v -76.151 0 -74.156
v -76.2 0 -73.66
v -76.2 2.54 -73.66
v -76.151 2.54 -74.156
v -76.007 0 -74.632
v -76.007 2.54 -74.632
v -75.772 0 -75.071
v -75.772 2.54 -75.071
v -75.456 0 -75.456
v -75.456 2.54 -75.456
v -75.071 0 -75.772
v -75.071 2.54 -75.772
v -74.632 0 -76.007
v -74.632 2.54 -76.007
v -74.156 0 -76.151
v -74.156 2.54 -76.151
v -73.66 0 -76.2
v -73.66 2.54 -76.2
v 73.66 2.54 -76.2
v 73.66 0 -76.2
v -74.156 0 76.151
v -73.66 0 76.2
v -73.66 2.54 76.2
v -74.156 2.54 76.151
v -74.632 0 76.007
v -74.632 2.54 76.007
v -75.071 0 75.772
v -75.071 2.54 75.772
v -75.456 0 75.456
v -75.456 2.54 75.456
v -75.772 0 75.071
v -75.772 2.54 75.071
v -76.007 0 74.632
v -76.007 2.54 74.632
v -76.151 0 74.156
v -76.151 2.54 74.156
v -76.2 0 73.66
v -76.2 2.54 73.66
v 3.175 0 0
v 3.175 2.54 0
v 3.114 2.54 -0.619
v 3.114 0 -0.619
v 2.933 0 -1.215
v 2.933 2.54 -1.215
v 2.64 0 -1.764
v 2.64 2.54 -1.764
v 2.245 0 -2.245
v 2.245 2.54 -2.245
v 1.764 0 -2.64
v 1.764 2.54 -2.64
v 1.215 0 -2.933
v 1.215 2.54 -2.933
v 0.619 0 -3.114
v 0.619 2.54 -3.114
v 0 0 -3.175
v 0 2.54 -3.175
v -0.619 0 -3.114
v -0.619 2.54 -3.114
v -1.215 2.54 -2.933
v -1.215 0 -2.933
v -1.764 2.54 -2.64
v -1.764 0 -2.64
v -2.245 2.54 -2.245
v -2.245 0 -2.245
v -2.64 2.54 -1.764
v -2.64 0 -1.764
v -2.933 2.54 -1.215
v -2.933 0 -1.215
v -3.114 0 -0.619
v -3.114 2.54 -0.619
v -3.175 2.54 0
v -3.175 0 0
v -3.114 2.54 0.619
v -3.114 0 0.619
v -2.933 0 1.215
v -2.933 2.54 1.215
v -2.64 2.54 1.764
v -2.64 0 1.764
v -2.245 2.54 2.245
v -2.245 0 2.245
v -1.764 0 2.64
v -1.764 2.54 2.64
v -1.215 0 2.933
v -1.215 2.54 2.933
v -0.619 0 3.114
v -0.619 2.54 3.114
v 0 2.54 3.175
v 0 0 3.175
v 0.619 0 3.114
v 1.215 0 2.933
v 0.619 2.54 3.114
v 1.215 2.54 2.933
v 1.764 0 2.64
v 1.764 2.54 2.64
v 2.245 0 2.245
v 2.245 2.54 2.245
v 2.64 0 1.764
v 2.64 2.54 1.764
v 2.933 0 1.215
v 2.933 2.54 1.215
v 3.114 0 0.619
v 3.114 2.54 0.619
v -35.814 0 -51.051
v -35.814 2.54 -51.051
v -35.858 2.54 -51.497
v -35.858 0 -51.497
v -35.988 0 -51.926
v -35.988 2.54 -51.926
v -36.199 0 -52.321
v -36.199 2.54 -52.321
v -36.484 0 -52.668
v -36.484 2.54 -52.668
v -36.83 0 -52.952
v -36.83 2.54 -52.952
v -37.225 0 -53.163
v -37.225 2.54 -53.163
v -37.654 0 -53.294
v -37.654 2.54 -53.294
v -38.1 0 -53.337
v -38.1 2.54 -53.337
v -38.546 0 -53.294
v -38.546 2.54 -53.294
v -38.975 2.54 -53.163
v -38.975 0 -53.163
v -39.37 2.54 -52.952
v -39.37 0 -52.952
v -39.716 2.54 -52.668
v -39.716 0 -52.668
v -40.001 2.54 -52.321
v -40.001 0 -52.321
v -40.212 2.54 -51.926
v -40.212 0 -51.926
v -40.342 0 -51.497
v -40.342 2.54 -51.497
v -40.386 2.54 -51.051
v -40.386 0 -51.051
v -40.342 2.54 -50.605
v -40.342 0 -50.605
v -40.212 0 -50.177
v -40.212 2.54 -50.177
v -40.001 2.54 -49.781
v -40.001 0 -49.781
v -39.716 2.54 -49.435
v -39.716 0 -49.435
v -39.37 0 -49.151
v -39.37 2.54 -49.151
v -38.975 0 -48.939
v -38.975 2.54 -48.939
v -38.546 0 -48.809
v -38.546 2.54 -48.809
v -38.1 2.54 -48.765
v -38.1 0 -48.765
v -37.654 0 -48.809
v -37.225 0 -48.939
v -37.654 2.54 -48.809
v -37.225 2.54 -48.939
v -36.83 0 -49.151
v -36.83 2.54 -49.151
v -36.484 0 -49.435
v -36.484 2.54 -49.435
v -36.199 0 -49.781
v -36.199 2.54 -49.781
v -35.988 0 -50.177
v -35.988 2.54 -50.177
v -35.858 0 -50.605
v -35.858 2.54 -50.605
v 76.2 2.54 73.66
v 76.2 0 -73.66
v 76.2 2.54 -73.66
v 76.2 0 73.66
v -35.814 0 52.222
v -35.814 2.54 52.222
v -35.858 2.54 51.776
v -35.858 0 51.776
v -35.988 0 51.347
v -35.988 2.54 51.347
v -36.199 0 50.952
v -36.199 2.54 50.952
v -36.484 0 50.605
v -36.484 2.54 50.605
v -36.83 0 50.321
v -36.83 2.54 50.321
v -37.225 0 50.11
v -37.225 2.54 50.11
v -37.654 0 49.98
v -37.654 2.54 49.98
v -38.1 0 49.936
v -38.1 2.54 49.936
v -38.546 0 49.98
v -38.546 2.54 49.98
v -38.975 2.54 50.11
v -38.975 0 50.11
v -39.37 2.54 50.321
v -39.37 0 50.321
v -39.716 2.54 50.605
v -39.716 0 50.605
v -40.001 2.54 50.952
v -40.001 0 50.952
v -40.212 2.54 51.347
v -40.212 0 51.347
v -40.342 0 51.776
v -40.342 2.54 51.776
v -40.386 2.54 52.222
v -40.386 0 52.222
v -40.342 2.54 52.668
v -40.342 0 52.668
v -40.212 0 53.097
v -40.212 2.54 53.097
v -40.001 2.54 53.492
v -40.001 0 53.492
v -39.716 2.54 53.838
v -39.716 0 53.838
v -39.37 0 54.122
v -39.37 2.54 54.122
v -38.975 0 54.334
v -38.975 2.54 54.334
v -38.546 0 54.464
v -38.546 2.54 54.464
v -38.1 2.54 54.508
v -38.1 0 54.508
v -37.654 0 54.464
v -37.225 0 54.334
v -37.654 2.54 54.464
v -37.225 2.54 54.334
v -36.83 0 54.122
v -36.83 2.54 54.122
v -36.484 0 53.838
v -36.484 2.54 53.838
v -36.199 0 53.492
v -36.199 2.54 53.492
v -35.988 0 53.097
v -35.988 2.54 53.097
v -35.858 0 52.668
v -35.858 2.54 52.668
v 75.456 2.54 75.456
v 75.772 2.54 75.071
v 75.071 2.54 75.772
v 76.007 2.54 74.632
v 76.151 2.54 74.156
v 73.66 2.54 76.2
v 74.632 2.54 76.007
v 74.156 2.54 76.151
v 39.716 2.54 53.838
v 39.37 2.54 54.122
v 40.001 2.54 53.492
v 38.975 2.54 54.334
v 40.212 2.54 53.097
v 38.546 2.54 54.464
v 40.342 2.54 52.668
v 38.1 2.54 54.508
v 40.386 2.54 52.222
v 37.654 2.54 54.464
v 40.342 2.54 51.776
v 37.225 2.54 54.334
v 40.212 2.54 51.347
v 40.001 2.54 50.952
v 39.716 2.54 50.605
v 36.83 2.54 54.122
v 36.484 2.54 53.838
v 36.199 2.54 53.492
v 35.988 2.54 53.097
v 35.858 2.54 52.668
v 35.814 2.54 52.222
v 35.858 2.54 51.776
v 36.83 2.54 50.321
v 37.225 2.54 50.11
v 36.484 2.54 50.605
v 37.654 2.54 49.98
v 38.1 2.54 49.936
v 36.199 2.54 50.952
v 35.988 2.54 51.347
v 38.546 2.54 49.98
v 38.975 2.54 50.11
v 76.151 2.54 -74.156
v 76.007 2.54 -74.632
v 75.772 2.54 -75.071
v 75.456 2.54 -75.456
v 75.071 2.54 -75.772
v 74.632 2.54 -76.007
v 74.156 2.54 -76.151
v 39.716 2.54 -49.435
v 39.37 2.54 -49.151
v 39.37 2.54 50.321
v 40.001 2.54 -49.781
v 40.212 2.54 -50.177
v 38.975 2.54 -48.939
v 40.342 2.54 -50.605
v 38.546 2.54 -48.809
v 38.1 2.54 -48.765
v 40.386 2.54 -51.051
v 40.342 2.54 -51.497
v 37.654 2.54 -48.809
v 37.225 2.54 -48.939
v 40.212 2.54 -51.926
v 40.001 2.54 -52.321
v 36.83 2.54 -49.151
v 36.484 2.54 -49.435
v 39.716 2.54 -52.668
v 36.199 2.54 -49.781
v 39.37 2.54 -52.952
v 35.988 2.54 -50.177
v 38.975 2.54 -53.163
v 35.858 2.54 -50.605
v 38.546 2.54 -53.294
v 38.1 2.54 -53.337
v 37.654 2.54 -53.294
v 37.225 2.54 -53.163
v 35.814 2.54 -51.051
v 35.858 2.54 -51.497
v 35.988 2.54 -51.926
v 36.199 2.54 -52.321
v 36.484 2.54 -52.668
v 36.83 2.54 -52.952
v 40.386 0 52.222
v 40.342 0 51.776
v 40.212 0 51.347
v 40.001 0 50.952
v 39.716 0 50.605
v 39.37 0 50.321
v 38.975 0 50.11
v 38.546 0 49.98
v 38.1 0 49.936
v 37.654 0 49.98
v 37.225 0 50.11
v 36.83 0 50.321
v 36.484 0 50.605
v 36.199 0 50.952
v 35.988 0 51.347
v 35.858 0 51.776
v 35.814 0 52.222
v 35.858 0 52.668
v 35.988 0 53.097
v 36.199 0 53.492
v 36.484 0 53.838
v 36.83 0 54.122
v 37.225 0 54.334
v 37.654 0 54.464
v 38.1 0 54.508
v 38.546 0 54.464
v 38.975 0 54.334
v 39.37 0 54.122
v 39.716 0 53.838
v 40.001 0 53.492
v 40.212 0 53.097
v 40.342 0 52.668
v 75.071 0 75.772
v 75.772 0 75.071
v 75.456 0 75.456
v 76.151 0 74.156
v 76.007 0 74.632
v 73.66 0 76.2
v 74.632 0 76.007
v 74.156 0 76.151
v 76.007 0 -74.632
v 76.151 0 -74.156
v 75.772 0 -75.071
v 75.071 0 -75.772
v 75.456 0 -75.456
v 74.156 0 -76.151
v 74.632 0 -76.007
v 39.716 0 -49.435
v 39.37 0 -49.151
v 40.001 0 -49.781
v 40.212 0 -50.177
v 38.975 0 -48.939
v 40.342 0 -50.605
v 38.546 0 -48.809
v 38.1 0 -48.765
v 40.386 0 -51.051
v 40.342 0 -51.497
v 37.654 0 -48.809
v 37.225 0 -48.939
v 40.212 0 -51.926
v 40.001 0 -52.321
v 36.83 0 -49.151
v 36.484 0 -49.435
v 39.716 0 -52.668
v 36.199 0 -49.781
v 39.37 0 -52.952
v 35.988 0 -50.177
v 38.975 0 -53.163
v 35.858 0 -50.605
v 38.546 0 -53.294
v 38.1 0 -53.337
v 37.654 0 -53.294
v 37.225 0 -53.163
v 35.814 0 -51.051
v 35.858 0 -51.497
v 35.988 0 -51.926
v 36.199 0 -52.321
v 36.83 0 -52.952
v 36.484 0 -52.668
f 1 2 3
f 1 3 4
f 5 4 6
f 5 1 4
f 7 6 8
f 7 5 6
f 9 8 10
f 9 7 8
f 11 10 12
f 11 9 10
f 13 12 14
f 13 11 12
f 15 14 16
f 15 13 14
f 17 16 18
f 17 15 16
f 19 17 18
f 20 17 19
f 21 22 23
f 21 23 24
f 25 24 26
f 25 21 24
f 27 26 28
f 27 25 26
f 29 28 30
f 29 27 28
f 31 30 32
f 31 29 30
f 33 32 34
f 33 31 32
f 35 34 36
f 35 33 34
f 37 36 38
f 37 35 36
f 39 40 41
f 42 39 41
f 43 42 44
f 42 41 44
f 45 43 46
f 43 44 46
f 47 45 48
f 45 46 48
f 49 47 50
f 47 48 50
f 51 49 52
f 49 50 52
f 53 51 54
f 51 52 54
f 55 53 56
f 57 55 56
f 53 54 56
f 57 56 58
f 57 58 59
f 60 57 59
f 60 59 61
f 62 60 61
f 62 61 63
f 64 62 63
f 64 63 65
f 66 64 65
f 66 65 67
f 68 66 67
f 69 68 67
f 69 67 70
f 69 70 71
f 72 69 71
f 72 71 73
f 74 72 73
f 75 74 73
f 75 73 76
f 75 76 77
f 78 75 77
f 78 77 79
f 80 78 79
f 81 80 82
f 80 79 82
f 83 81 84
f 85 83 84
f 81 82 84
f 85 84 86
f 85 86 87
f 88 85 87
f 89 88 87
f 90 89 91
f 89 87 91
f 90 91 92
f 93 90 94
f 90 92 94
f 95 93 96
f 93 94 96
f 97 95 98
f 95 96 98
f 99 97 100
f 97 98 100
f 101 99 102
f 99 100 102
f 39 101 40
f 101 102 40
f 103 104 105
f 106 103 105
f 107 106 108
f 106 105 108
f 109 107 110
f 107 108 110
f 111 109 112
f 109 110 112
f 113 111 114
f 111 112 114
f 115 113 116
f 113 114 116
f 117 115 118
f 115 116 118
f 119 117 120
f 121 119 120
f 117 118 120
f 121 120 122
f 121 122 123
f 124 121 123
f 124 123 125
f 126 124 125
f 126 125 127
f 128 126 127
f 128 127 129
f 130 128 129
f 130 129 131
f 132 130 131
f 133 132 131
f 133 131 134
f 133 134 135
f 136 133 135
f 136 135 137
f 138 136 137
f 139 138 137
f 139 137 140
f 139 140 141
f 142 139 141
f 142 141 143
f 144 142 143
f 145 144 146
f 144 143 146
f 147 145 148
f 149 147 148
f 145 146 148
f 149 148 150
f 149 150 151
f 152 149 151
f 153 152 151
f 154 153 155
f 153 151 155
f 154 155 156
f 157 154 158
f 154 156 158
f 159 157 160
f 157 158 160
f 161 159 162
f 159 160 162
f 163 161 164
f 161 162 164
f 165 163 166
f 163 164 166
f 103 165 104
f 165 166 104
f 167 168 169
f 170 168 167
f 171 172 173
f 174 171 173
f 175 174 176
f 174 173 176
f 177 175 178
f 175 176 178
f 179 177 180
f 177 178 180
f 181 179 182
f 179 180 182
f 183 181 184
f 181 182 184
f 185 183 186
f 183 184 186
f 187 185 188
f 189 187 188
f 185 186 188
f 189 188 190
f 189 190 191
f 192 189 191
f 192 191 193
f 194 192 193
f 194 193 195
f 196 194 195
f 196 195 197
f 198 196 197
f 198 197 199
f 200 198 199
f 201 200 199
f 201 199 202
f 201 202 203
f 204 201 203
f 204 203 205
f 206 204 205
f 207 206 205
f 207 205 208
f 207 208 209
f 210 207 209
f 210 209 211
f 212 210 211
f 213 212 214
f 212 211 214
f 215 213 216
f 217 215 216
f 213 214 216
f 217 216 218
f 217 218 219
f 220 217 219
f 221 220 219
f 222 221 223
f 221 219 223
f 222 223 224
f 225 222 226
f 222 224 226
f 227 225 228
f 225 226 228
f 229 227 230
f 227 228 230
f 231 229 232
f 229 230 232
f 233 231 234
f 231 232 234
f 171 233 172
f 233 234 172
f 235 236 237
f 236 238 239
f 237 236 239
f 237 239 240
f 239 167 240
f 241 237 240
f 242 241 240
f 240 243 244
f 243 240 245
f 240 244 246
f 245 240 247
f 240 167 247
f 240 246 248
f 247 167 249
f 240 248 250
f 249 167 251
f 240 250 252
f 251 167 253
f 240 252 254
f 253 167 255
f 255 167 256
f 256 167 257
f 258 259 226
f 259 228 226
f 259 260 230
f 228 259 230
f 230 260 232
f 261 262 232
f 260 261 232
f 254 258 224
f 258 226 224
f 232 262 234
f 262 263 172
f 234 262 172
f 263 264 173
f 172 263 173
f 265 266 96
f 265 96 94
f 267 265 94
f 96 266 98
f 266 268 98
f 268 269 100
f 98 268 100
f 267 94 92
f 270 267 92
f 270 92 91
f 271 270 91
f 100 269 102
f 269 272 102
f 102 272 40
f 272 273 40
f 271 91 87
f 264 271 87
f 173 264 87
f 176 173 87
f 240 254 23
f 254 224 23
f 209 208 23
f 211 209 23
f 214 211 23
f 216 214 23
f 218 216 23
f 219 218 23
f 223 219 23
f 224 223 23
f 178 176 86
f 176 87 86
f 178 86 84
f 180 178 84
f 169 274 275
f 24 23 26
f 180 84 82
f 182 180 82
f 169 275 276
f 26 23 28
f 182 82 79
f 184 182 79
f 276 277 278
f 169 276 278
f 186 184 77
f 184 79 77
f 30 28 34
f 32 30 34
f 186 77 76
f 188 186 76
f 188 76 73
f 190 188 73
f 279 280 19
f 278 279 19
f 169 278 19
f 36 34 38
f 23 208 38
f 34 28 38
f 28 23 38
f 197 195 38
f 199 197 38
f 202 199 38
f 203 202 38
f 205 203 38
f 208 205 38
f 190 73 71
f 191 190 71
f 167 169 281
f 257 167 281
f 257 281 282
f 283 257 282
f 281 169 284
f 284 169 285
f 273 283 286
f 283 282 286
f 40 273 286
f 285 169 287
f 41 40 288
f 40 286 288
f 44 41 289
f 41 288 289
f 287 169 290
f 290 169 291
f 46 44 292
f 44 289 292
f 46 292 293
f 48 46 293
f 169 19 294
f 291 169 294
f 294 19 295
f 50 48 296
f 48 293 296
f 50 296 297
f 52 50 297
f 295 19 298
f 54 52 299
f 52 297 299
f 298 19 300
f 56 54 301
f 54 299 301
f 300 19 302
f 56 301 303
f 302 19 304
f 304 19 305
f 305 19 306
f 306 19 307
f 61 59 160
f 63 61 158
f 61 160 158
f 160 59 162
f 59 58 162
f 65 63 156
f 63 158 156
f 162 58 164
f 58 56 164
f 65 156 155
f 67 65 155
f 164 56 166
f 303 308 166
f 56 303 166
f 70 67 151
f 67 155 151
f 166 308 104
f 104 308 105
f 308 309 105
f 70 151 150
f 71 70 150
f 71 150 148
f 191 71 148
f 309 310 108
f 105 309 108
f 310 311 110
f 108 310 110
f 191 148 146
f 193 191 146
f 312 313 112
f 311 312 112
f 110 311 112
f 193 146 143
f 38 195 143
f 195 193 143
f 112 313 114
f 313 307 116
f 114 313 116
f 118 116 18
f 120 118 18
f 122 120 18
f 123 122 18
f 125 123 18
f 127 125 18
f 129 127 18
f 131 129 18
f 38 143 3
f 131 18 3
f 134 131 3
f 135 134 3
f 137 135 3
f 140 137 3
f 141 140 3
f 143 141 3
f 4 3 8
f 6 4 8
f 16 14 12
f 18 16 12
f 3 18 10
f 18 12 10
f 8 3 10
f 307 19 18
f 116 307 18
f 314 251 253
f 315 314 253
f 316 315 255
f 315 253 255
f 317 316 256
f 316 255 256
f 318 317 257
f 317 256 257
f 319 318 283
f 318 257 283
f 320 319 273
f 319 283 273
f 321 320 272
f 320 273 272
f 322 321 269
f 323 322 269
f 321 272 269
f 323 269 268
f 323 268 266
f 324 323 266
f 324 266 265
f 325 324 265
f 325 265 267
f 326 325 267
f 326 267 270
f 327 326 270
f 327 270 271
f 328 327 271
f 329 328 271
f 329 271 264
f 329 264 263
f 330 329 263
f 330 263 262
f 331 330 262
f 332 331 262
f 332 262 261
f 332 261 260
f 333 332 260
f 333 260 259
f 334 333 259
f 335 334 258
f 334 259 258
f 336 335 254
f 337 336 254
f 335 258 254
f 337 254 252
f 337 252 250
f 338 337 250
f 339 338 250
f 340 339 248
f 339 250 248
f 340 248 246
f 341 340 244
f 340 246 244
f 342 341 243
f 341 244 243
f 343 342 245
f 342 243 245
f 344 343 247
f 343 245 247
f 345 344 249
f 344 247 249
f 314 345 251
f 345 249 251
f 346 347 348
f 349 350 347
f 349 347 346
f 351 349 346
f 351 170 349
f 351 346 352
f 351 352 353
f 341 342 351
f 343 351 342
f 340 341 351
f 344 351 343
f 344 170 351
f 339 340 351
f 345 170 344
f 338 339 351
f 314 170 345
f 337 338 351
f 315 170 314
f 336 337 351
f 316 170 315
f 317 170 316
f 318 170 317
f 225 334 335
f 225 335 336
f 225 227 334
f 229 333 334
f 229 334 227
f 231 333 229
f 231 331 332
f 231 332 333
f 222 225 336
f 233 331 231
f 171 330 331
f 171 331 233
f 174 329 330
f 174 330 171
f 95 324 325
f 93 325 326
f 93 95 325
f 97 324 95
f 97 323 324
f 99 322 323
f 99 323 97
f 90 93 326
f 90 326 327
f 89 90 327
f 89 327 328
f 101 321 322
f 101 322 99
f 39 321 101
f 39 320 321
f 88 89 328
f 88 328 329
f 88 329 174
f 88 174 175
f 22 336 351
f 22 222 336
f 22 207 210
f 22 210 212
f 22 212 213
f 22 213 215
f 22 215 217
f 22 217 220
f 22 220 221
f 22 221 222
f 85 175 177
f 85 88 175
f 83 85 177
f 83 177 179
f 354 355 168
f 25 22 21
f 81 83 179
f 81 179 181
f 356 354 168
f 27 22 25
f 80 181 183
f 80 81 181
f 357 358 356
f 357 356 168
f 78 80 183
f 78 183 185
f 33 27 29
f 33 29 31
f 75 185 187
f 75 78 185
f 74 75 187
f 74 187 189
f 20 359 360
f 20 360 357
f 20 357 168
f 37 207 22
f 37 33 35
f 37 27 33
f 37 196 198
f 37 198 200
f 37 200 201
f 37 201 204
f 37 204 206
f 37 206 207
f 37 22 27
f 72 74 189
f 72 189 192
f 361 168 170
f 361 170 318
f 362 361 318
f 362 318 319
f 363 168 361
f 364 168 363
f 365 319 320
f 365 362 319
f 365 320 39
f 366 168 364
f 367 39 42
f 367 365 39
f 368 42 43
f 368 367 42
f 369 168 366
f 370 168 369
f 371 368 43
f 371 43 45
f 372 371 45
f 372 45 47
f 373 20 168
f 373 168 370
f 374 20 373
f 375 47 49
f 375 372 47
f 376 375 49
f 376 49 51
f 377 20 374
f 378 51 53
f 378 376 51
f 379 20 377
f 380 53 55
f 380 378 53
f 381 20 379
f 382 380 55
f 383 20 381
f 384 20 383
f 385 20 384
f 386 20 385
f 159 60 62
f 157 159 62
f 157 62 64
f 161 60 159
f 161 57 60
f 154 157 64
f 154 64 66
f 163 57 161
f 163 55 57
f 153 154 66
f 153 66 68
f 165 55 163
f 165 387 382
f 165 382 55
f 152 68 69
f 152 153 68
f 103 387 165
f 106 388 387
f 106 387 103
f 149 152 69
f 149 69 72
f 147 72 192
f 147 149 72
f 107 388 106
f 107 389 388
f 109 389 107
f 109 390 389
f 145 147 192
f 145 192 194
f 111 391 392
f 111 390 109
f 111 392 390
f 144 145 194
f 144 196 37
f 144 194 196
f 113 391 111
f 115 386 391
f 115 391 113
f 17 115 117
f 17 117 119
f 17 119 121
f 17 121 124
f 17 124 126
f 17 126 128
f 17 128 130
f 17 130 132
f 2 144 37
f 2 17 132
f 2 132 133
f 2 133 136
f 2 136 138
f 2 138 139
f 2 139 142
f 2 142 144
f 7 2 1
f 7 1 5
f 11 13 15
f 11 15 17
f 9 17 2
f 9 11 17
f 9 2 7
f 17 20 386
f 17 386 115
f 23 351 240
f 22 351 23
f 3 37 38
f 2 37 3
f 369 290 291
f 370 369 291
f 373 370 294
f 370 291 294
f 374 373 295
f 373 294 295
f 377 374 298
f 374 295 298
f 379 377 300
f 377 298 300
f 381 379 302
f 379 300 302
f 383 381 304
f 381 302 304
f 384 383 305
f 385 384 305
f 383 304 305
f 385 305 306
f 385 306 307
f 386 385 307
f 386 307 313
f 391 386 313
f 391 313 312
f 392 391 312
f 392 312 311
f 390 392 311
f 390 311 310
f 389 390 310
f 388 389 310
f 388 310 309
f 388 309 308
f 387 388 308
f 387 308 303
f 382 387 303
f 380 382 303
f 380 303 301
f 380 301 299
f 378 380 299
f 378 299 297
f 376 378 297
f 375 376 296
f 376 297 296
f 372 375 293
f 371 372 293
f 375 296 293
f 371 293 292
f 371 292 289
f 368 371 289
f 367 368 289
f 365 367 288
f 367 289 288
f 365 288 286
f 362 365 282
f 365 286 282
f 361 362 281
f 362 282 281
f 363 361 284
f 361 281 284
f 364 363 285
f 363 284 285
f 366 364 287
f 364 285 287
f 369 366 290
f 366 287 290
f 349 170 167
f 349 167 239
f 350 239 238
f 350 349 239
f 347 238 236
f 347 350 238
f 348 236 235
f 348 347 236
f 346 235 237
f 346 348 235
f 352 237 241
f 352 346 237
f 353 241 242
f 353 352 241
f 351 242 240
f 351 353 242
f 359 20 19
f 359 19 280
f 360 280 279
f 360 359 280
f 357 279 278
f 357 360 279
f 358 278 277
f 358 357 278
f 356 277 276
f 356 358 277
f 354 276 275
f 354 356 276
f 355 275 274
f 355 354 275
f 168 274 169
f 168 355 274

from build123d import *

# Parameters (mm, degrees)
SKETCH1_R           = 1.4224
BOSS_EXTRUDE1_DEPTH = 2.54
SKETCH2_R           = 2.286
SKETCH2_R_2         = 3.175
CUT_EXTRUDE1_DEPTH  = 3.54


with BuildPart() as part:
    # Sketch1 → Boss-Extrude1 (new body)
    with BuildSketch(Plane(origin=(0, 0, 0), x_dir=(1, 0, 0), z_dir=(0, 1, 0))):
        with BuildLine():
            Line((-73.66, 76.2), (73.66, 76.2))
            ThreePointArc((73.66, 76.2), (75.456051224, 75.456051224), (76.2, 73.66))
            Line((76.2, 73.66), (76.2, -73.66))
            ThreePointArc((76.2, -73.66), (75.456051224, -75.456051224), (73.66, -76.2))
            Line((73.66, -76.2), (-73.66, -76.2))
            ThreePointArc((-73.66, -76.2), (-75.456051224, -75.456051224), (-76.2, -73.66))
            Line((-76.2, -73.66), (-76.2, 73.66))
            ThreePointArc((-76.2, 73.66), (-75.456051224, 75.456051224), (-73.66, 76.2))
        make_face()
        Circle(SKETCH1_R, mode=Mode.SUBTRACT)
    extrude(amount=BOSS_EXTRUDE1_DEPTH)

    # Sketch2 → Cut-Extrude1 (cut, through all)
    with BuildSketch(Plane(origin=(0, 2.54, 0), x_dir=(1, 0, 0), z_dir=(0, 1, 0))):
        with Locations((-38.1, 51.05145896)):
            Circle(SKETCH2_R)
        with Locations((38.1, 51.05145896)):
            Circle(SKETCH2_R)
        with Locations((38.1, -52.221692976)):
            Circle(SKETCH2_R)
        with Locations((-38.1, -52.221692976)):
            Circle(SKETCH2_R)
        Circle(SKETCH2_R_2)
    extrude(amount=-CUT_EXTRUDE1_DEPTH, mode=Mode.SUBTRACT)


solid = part.part
